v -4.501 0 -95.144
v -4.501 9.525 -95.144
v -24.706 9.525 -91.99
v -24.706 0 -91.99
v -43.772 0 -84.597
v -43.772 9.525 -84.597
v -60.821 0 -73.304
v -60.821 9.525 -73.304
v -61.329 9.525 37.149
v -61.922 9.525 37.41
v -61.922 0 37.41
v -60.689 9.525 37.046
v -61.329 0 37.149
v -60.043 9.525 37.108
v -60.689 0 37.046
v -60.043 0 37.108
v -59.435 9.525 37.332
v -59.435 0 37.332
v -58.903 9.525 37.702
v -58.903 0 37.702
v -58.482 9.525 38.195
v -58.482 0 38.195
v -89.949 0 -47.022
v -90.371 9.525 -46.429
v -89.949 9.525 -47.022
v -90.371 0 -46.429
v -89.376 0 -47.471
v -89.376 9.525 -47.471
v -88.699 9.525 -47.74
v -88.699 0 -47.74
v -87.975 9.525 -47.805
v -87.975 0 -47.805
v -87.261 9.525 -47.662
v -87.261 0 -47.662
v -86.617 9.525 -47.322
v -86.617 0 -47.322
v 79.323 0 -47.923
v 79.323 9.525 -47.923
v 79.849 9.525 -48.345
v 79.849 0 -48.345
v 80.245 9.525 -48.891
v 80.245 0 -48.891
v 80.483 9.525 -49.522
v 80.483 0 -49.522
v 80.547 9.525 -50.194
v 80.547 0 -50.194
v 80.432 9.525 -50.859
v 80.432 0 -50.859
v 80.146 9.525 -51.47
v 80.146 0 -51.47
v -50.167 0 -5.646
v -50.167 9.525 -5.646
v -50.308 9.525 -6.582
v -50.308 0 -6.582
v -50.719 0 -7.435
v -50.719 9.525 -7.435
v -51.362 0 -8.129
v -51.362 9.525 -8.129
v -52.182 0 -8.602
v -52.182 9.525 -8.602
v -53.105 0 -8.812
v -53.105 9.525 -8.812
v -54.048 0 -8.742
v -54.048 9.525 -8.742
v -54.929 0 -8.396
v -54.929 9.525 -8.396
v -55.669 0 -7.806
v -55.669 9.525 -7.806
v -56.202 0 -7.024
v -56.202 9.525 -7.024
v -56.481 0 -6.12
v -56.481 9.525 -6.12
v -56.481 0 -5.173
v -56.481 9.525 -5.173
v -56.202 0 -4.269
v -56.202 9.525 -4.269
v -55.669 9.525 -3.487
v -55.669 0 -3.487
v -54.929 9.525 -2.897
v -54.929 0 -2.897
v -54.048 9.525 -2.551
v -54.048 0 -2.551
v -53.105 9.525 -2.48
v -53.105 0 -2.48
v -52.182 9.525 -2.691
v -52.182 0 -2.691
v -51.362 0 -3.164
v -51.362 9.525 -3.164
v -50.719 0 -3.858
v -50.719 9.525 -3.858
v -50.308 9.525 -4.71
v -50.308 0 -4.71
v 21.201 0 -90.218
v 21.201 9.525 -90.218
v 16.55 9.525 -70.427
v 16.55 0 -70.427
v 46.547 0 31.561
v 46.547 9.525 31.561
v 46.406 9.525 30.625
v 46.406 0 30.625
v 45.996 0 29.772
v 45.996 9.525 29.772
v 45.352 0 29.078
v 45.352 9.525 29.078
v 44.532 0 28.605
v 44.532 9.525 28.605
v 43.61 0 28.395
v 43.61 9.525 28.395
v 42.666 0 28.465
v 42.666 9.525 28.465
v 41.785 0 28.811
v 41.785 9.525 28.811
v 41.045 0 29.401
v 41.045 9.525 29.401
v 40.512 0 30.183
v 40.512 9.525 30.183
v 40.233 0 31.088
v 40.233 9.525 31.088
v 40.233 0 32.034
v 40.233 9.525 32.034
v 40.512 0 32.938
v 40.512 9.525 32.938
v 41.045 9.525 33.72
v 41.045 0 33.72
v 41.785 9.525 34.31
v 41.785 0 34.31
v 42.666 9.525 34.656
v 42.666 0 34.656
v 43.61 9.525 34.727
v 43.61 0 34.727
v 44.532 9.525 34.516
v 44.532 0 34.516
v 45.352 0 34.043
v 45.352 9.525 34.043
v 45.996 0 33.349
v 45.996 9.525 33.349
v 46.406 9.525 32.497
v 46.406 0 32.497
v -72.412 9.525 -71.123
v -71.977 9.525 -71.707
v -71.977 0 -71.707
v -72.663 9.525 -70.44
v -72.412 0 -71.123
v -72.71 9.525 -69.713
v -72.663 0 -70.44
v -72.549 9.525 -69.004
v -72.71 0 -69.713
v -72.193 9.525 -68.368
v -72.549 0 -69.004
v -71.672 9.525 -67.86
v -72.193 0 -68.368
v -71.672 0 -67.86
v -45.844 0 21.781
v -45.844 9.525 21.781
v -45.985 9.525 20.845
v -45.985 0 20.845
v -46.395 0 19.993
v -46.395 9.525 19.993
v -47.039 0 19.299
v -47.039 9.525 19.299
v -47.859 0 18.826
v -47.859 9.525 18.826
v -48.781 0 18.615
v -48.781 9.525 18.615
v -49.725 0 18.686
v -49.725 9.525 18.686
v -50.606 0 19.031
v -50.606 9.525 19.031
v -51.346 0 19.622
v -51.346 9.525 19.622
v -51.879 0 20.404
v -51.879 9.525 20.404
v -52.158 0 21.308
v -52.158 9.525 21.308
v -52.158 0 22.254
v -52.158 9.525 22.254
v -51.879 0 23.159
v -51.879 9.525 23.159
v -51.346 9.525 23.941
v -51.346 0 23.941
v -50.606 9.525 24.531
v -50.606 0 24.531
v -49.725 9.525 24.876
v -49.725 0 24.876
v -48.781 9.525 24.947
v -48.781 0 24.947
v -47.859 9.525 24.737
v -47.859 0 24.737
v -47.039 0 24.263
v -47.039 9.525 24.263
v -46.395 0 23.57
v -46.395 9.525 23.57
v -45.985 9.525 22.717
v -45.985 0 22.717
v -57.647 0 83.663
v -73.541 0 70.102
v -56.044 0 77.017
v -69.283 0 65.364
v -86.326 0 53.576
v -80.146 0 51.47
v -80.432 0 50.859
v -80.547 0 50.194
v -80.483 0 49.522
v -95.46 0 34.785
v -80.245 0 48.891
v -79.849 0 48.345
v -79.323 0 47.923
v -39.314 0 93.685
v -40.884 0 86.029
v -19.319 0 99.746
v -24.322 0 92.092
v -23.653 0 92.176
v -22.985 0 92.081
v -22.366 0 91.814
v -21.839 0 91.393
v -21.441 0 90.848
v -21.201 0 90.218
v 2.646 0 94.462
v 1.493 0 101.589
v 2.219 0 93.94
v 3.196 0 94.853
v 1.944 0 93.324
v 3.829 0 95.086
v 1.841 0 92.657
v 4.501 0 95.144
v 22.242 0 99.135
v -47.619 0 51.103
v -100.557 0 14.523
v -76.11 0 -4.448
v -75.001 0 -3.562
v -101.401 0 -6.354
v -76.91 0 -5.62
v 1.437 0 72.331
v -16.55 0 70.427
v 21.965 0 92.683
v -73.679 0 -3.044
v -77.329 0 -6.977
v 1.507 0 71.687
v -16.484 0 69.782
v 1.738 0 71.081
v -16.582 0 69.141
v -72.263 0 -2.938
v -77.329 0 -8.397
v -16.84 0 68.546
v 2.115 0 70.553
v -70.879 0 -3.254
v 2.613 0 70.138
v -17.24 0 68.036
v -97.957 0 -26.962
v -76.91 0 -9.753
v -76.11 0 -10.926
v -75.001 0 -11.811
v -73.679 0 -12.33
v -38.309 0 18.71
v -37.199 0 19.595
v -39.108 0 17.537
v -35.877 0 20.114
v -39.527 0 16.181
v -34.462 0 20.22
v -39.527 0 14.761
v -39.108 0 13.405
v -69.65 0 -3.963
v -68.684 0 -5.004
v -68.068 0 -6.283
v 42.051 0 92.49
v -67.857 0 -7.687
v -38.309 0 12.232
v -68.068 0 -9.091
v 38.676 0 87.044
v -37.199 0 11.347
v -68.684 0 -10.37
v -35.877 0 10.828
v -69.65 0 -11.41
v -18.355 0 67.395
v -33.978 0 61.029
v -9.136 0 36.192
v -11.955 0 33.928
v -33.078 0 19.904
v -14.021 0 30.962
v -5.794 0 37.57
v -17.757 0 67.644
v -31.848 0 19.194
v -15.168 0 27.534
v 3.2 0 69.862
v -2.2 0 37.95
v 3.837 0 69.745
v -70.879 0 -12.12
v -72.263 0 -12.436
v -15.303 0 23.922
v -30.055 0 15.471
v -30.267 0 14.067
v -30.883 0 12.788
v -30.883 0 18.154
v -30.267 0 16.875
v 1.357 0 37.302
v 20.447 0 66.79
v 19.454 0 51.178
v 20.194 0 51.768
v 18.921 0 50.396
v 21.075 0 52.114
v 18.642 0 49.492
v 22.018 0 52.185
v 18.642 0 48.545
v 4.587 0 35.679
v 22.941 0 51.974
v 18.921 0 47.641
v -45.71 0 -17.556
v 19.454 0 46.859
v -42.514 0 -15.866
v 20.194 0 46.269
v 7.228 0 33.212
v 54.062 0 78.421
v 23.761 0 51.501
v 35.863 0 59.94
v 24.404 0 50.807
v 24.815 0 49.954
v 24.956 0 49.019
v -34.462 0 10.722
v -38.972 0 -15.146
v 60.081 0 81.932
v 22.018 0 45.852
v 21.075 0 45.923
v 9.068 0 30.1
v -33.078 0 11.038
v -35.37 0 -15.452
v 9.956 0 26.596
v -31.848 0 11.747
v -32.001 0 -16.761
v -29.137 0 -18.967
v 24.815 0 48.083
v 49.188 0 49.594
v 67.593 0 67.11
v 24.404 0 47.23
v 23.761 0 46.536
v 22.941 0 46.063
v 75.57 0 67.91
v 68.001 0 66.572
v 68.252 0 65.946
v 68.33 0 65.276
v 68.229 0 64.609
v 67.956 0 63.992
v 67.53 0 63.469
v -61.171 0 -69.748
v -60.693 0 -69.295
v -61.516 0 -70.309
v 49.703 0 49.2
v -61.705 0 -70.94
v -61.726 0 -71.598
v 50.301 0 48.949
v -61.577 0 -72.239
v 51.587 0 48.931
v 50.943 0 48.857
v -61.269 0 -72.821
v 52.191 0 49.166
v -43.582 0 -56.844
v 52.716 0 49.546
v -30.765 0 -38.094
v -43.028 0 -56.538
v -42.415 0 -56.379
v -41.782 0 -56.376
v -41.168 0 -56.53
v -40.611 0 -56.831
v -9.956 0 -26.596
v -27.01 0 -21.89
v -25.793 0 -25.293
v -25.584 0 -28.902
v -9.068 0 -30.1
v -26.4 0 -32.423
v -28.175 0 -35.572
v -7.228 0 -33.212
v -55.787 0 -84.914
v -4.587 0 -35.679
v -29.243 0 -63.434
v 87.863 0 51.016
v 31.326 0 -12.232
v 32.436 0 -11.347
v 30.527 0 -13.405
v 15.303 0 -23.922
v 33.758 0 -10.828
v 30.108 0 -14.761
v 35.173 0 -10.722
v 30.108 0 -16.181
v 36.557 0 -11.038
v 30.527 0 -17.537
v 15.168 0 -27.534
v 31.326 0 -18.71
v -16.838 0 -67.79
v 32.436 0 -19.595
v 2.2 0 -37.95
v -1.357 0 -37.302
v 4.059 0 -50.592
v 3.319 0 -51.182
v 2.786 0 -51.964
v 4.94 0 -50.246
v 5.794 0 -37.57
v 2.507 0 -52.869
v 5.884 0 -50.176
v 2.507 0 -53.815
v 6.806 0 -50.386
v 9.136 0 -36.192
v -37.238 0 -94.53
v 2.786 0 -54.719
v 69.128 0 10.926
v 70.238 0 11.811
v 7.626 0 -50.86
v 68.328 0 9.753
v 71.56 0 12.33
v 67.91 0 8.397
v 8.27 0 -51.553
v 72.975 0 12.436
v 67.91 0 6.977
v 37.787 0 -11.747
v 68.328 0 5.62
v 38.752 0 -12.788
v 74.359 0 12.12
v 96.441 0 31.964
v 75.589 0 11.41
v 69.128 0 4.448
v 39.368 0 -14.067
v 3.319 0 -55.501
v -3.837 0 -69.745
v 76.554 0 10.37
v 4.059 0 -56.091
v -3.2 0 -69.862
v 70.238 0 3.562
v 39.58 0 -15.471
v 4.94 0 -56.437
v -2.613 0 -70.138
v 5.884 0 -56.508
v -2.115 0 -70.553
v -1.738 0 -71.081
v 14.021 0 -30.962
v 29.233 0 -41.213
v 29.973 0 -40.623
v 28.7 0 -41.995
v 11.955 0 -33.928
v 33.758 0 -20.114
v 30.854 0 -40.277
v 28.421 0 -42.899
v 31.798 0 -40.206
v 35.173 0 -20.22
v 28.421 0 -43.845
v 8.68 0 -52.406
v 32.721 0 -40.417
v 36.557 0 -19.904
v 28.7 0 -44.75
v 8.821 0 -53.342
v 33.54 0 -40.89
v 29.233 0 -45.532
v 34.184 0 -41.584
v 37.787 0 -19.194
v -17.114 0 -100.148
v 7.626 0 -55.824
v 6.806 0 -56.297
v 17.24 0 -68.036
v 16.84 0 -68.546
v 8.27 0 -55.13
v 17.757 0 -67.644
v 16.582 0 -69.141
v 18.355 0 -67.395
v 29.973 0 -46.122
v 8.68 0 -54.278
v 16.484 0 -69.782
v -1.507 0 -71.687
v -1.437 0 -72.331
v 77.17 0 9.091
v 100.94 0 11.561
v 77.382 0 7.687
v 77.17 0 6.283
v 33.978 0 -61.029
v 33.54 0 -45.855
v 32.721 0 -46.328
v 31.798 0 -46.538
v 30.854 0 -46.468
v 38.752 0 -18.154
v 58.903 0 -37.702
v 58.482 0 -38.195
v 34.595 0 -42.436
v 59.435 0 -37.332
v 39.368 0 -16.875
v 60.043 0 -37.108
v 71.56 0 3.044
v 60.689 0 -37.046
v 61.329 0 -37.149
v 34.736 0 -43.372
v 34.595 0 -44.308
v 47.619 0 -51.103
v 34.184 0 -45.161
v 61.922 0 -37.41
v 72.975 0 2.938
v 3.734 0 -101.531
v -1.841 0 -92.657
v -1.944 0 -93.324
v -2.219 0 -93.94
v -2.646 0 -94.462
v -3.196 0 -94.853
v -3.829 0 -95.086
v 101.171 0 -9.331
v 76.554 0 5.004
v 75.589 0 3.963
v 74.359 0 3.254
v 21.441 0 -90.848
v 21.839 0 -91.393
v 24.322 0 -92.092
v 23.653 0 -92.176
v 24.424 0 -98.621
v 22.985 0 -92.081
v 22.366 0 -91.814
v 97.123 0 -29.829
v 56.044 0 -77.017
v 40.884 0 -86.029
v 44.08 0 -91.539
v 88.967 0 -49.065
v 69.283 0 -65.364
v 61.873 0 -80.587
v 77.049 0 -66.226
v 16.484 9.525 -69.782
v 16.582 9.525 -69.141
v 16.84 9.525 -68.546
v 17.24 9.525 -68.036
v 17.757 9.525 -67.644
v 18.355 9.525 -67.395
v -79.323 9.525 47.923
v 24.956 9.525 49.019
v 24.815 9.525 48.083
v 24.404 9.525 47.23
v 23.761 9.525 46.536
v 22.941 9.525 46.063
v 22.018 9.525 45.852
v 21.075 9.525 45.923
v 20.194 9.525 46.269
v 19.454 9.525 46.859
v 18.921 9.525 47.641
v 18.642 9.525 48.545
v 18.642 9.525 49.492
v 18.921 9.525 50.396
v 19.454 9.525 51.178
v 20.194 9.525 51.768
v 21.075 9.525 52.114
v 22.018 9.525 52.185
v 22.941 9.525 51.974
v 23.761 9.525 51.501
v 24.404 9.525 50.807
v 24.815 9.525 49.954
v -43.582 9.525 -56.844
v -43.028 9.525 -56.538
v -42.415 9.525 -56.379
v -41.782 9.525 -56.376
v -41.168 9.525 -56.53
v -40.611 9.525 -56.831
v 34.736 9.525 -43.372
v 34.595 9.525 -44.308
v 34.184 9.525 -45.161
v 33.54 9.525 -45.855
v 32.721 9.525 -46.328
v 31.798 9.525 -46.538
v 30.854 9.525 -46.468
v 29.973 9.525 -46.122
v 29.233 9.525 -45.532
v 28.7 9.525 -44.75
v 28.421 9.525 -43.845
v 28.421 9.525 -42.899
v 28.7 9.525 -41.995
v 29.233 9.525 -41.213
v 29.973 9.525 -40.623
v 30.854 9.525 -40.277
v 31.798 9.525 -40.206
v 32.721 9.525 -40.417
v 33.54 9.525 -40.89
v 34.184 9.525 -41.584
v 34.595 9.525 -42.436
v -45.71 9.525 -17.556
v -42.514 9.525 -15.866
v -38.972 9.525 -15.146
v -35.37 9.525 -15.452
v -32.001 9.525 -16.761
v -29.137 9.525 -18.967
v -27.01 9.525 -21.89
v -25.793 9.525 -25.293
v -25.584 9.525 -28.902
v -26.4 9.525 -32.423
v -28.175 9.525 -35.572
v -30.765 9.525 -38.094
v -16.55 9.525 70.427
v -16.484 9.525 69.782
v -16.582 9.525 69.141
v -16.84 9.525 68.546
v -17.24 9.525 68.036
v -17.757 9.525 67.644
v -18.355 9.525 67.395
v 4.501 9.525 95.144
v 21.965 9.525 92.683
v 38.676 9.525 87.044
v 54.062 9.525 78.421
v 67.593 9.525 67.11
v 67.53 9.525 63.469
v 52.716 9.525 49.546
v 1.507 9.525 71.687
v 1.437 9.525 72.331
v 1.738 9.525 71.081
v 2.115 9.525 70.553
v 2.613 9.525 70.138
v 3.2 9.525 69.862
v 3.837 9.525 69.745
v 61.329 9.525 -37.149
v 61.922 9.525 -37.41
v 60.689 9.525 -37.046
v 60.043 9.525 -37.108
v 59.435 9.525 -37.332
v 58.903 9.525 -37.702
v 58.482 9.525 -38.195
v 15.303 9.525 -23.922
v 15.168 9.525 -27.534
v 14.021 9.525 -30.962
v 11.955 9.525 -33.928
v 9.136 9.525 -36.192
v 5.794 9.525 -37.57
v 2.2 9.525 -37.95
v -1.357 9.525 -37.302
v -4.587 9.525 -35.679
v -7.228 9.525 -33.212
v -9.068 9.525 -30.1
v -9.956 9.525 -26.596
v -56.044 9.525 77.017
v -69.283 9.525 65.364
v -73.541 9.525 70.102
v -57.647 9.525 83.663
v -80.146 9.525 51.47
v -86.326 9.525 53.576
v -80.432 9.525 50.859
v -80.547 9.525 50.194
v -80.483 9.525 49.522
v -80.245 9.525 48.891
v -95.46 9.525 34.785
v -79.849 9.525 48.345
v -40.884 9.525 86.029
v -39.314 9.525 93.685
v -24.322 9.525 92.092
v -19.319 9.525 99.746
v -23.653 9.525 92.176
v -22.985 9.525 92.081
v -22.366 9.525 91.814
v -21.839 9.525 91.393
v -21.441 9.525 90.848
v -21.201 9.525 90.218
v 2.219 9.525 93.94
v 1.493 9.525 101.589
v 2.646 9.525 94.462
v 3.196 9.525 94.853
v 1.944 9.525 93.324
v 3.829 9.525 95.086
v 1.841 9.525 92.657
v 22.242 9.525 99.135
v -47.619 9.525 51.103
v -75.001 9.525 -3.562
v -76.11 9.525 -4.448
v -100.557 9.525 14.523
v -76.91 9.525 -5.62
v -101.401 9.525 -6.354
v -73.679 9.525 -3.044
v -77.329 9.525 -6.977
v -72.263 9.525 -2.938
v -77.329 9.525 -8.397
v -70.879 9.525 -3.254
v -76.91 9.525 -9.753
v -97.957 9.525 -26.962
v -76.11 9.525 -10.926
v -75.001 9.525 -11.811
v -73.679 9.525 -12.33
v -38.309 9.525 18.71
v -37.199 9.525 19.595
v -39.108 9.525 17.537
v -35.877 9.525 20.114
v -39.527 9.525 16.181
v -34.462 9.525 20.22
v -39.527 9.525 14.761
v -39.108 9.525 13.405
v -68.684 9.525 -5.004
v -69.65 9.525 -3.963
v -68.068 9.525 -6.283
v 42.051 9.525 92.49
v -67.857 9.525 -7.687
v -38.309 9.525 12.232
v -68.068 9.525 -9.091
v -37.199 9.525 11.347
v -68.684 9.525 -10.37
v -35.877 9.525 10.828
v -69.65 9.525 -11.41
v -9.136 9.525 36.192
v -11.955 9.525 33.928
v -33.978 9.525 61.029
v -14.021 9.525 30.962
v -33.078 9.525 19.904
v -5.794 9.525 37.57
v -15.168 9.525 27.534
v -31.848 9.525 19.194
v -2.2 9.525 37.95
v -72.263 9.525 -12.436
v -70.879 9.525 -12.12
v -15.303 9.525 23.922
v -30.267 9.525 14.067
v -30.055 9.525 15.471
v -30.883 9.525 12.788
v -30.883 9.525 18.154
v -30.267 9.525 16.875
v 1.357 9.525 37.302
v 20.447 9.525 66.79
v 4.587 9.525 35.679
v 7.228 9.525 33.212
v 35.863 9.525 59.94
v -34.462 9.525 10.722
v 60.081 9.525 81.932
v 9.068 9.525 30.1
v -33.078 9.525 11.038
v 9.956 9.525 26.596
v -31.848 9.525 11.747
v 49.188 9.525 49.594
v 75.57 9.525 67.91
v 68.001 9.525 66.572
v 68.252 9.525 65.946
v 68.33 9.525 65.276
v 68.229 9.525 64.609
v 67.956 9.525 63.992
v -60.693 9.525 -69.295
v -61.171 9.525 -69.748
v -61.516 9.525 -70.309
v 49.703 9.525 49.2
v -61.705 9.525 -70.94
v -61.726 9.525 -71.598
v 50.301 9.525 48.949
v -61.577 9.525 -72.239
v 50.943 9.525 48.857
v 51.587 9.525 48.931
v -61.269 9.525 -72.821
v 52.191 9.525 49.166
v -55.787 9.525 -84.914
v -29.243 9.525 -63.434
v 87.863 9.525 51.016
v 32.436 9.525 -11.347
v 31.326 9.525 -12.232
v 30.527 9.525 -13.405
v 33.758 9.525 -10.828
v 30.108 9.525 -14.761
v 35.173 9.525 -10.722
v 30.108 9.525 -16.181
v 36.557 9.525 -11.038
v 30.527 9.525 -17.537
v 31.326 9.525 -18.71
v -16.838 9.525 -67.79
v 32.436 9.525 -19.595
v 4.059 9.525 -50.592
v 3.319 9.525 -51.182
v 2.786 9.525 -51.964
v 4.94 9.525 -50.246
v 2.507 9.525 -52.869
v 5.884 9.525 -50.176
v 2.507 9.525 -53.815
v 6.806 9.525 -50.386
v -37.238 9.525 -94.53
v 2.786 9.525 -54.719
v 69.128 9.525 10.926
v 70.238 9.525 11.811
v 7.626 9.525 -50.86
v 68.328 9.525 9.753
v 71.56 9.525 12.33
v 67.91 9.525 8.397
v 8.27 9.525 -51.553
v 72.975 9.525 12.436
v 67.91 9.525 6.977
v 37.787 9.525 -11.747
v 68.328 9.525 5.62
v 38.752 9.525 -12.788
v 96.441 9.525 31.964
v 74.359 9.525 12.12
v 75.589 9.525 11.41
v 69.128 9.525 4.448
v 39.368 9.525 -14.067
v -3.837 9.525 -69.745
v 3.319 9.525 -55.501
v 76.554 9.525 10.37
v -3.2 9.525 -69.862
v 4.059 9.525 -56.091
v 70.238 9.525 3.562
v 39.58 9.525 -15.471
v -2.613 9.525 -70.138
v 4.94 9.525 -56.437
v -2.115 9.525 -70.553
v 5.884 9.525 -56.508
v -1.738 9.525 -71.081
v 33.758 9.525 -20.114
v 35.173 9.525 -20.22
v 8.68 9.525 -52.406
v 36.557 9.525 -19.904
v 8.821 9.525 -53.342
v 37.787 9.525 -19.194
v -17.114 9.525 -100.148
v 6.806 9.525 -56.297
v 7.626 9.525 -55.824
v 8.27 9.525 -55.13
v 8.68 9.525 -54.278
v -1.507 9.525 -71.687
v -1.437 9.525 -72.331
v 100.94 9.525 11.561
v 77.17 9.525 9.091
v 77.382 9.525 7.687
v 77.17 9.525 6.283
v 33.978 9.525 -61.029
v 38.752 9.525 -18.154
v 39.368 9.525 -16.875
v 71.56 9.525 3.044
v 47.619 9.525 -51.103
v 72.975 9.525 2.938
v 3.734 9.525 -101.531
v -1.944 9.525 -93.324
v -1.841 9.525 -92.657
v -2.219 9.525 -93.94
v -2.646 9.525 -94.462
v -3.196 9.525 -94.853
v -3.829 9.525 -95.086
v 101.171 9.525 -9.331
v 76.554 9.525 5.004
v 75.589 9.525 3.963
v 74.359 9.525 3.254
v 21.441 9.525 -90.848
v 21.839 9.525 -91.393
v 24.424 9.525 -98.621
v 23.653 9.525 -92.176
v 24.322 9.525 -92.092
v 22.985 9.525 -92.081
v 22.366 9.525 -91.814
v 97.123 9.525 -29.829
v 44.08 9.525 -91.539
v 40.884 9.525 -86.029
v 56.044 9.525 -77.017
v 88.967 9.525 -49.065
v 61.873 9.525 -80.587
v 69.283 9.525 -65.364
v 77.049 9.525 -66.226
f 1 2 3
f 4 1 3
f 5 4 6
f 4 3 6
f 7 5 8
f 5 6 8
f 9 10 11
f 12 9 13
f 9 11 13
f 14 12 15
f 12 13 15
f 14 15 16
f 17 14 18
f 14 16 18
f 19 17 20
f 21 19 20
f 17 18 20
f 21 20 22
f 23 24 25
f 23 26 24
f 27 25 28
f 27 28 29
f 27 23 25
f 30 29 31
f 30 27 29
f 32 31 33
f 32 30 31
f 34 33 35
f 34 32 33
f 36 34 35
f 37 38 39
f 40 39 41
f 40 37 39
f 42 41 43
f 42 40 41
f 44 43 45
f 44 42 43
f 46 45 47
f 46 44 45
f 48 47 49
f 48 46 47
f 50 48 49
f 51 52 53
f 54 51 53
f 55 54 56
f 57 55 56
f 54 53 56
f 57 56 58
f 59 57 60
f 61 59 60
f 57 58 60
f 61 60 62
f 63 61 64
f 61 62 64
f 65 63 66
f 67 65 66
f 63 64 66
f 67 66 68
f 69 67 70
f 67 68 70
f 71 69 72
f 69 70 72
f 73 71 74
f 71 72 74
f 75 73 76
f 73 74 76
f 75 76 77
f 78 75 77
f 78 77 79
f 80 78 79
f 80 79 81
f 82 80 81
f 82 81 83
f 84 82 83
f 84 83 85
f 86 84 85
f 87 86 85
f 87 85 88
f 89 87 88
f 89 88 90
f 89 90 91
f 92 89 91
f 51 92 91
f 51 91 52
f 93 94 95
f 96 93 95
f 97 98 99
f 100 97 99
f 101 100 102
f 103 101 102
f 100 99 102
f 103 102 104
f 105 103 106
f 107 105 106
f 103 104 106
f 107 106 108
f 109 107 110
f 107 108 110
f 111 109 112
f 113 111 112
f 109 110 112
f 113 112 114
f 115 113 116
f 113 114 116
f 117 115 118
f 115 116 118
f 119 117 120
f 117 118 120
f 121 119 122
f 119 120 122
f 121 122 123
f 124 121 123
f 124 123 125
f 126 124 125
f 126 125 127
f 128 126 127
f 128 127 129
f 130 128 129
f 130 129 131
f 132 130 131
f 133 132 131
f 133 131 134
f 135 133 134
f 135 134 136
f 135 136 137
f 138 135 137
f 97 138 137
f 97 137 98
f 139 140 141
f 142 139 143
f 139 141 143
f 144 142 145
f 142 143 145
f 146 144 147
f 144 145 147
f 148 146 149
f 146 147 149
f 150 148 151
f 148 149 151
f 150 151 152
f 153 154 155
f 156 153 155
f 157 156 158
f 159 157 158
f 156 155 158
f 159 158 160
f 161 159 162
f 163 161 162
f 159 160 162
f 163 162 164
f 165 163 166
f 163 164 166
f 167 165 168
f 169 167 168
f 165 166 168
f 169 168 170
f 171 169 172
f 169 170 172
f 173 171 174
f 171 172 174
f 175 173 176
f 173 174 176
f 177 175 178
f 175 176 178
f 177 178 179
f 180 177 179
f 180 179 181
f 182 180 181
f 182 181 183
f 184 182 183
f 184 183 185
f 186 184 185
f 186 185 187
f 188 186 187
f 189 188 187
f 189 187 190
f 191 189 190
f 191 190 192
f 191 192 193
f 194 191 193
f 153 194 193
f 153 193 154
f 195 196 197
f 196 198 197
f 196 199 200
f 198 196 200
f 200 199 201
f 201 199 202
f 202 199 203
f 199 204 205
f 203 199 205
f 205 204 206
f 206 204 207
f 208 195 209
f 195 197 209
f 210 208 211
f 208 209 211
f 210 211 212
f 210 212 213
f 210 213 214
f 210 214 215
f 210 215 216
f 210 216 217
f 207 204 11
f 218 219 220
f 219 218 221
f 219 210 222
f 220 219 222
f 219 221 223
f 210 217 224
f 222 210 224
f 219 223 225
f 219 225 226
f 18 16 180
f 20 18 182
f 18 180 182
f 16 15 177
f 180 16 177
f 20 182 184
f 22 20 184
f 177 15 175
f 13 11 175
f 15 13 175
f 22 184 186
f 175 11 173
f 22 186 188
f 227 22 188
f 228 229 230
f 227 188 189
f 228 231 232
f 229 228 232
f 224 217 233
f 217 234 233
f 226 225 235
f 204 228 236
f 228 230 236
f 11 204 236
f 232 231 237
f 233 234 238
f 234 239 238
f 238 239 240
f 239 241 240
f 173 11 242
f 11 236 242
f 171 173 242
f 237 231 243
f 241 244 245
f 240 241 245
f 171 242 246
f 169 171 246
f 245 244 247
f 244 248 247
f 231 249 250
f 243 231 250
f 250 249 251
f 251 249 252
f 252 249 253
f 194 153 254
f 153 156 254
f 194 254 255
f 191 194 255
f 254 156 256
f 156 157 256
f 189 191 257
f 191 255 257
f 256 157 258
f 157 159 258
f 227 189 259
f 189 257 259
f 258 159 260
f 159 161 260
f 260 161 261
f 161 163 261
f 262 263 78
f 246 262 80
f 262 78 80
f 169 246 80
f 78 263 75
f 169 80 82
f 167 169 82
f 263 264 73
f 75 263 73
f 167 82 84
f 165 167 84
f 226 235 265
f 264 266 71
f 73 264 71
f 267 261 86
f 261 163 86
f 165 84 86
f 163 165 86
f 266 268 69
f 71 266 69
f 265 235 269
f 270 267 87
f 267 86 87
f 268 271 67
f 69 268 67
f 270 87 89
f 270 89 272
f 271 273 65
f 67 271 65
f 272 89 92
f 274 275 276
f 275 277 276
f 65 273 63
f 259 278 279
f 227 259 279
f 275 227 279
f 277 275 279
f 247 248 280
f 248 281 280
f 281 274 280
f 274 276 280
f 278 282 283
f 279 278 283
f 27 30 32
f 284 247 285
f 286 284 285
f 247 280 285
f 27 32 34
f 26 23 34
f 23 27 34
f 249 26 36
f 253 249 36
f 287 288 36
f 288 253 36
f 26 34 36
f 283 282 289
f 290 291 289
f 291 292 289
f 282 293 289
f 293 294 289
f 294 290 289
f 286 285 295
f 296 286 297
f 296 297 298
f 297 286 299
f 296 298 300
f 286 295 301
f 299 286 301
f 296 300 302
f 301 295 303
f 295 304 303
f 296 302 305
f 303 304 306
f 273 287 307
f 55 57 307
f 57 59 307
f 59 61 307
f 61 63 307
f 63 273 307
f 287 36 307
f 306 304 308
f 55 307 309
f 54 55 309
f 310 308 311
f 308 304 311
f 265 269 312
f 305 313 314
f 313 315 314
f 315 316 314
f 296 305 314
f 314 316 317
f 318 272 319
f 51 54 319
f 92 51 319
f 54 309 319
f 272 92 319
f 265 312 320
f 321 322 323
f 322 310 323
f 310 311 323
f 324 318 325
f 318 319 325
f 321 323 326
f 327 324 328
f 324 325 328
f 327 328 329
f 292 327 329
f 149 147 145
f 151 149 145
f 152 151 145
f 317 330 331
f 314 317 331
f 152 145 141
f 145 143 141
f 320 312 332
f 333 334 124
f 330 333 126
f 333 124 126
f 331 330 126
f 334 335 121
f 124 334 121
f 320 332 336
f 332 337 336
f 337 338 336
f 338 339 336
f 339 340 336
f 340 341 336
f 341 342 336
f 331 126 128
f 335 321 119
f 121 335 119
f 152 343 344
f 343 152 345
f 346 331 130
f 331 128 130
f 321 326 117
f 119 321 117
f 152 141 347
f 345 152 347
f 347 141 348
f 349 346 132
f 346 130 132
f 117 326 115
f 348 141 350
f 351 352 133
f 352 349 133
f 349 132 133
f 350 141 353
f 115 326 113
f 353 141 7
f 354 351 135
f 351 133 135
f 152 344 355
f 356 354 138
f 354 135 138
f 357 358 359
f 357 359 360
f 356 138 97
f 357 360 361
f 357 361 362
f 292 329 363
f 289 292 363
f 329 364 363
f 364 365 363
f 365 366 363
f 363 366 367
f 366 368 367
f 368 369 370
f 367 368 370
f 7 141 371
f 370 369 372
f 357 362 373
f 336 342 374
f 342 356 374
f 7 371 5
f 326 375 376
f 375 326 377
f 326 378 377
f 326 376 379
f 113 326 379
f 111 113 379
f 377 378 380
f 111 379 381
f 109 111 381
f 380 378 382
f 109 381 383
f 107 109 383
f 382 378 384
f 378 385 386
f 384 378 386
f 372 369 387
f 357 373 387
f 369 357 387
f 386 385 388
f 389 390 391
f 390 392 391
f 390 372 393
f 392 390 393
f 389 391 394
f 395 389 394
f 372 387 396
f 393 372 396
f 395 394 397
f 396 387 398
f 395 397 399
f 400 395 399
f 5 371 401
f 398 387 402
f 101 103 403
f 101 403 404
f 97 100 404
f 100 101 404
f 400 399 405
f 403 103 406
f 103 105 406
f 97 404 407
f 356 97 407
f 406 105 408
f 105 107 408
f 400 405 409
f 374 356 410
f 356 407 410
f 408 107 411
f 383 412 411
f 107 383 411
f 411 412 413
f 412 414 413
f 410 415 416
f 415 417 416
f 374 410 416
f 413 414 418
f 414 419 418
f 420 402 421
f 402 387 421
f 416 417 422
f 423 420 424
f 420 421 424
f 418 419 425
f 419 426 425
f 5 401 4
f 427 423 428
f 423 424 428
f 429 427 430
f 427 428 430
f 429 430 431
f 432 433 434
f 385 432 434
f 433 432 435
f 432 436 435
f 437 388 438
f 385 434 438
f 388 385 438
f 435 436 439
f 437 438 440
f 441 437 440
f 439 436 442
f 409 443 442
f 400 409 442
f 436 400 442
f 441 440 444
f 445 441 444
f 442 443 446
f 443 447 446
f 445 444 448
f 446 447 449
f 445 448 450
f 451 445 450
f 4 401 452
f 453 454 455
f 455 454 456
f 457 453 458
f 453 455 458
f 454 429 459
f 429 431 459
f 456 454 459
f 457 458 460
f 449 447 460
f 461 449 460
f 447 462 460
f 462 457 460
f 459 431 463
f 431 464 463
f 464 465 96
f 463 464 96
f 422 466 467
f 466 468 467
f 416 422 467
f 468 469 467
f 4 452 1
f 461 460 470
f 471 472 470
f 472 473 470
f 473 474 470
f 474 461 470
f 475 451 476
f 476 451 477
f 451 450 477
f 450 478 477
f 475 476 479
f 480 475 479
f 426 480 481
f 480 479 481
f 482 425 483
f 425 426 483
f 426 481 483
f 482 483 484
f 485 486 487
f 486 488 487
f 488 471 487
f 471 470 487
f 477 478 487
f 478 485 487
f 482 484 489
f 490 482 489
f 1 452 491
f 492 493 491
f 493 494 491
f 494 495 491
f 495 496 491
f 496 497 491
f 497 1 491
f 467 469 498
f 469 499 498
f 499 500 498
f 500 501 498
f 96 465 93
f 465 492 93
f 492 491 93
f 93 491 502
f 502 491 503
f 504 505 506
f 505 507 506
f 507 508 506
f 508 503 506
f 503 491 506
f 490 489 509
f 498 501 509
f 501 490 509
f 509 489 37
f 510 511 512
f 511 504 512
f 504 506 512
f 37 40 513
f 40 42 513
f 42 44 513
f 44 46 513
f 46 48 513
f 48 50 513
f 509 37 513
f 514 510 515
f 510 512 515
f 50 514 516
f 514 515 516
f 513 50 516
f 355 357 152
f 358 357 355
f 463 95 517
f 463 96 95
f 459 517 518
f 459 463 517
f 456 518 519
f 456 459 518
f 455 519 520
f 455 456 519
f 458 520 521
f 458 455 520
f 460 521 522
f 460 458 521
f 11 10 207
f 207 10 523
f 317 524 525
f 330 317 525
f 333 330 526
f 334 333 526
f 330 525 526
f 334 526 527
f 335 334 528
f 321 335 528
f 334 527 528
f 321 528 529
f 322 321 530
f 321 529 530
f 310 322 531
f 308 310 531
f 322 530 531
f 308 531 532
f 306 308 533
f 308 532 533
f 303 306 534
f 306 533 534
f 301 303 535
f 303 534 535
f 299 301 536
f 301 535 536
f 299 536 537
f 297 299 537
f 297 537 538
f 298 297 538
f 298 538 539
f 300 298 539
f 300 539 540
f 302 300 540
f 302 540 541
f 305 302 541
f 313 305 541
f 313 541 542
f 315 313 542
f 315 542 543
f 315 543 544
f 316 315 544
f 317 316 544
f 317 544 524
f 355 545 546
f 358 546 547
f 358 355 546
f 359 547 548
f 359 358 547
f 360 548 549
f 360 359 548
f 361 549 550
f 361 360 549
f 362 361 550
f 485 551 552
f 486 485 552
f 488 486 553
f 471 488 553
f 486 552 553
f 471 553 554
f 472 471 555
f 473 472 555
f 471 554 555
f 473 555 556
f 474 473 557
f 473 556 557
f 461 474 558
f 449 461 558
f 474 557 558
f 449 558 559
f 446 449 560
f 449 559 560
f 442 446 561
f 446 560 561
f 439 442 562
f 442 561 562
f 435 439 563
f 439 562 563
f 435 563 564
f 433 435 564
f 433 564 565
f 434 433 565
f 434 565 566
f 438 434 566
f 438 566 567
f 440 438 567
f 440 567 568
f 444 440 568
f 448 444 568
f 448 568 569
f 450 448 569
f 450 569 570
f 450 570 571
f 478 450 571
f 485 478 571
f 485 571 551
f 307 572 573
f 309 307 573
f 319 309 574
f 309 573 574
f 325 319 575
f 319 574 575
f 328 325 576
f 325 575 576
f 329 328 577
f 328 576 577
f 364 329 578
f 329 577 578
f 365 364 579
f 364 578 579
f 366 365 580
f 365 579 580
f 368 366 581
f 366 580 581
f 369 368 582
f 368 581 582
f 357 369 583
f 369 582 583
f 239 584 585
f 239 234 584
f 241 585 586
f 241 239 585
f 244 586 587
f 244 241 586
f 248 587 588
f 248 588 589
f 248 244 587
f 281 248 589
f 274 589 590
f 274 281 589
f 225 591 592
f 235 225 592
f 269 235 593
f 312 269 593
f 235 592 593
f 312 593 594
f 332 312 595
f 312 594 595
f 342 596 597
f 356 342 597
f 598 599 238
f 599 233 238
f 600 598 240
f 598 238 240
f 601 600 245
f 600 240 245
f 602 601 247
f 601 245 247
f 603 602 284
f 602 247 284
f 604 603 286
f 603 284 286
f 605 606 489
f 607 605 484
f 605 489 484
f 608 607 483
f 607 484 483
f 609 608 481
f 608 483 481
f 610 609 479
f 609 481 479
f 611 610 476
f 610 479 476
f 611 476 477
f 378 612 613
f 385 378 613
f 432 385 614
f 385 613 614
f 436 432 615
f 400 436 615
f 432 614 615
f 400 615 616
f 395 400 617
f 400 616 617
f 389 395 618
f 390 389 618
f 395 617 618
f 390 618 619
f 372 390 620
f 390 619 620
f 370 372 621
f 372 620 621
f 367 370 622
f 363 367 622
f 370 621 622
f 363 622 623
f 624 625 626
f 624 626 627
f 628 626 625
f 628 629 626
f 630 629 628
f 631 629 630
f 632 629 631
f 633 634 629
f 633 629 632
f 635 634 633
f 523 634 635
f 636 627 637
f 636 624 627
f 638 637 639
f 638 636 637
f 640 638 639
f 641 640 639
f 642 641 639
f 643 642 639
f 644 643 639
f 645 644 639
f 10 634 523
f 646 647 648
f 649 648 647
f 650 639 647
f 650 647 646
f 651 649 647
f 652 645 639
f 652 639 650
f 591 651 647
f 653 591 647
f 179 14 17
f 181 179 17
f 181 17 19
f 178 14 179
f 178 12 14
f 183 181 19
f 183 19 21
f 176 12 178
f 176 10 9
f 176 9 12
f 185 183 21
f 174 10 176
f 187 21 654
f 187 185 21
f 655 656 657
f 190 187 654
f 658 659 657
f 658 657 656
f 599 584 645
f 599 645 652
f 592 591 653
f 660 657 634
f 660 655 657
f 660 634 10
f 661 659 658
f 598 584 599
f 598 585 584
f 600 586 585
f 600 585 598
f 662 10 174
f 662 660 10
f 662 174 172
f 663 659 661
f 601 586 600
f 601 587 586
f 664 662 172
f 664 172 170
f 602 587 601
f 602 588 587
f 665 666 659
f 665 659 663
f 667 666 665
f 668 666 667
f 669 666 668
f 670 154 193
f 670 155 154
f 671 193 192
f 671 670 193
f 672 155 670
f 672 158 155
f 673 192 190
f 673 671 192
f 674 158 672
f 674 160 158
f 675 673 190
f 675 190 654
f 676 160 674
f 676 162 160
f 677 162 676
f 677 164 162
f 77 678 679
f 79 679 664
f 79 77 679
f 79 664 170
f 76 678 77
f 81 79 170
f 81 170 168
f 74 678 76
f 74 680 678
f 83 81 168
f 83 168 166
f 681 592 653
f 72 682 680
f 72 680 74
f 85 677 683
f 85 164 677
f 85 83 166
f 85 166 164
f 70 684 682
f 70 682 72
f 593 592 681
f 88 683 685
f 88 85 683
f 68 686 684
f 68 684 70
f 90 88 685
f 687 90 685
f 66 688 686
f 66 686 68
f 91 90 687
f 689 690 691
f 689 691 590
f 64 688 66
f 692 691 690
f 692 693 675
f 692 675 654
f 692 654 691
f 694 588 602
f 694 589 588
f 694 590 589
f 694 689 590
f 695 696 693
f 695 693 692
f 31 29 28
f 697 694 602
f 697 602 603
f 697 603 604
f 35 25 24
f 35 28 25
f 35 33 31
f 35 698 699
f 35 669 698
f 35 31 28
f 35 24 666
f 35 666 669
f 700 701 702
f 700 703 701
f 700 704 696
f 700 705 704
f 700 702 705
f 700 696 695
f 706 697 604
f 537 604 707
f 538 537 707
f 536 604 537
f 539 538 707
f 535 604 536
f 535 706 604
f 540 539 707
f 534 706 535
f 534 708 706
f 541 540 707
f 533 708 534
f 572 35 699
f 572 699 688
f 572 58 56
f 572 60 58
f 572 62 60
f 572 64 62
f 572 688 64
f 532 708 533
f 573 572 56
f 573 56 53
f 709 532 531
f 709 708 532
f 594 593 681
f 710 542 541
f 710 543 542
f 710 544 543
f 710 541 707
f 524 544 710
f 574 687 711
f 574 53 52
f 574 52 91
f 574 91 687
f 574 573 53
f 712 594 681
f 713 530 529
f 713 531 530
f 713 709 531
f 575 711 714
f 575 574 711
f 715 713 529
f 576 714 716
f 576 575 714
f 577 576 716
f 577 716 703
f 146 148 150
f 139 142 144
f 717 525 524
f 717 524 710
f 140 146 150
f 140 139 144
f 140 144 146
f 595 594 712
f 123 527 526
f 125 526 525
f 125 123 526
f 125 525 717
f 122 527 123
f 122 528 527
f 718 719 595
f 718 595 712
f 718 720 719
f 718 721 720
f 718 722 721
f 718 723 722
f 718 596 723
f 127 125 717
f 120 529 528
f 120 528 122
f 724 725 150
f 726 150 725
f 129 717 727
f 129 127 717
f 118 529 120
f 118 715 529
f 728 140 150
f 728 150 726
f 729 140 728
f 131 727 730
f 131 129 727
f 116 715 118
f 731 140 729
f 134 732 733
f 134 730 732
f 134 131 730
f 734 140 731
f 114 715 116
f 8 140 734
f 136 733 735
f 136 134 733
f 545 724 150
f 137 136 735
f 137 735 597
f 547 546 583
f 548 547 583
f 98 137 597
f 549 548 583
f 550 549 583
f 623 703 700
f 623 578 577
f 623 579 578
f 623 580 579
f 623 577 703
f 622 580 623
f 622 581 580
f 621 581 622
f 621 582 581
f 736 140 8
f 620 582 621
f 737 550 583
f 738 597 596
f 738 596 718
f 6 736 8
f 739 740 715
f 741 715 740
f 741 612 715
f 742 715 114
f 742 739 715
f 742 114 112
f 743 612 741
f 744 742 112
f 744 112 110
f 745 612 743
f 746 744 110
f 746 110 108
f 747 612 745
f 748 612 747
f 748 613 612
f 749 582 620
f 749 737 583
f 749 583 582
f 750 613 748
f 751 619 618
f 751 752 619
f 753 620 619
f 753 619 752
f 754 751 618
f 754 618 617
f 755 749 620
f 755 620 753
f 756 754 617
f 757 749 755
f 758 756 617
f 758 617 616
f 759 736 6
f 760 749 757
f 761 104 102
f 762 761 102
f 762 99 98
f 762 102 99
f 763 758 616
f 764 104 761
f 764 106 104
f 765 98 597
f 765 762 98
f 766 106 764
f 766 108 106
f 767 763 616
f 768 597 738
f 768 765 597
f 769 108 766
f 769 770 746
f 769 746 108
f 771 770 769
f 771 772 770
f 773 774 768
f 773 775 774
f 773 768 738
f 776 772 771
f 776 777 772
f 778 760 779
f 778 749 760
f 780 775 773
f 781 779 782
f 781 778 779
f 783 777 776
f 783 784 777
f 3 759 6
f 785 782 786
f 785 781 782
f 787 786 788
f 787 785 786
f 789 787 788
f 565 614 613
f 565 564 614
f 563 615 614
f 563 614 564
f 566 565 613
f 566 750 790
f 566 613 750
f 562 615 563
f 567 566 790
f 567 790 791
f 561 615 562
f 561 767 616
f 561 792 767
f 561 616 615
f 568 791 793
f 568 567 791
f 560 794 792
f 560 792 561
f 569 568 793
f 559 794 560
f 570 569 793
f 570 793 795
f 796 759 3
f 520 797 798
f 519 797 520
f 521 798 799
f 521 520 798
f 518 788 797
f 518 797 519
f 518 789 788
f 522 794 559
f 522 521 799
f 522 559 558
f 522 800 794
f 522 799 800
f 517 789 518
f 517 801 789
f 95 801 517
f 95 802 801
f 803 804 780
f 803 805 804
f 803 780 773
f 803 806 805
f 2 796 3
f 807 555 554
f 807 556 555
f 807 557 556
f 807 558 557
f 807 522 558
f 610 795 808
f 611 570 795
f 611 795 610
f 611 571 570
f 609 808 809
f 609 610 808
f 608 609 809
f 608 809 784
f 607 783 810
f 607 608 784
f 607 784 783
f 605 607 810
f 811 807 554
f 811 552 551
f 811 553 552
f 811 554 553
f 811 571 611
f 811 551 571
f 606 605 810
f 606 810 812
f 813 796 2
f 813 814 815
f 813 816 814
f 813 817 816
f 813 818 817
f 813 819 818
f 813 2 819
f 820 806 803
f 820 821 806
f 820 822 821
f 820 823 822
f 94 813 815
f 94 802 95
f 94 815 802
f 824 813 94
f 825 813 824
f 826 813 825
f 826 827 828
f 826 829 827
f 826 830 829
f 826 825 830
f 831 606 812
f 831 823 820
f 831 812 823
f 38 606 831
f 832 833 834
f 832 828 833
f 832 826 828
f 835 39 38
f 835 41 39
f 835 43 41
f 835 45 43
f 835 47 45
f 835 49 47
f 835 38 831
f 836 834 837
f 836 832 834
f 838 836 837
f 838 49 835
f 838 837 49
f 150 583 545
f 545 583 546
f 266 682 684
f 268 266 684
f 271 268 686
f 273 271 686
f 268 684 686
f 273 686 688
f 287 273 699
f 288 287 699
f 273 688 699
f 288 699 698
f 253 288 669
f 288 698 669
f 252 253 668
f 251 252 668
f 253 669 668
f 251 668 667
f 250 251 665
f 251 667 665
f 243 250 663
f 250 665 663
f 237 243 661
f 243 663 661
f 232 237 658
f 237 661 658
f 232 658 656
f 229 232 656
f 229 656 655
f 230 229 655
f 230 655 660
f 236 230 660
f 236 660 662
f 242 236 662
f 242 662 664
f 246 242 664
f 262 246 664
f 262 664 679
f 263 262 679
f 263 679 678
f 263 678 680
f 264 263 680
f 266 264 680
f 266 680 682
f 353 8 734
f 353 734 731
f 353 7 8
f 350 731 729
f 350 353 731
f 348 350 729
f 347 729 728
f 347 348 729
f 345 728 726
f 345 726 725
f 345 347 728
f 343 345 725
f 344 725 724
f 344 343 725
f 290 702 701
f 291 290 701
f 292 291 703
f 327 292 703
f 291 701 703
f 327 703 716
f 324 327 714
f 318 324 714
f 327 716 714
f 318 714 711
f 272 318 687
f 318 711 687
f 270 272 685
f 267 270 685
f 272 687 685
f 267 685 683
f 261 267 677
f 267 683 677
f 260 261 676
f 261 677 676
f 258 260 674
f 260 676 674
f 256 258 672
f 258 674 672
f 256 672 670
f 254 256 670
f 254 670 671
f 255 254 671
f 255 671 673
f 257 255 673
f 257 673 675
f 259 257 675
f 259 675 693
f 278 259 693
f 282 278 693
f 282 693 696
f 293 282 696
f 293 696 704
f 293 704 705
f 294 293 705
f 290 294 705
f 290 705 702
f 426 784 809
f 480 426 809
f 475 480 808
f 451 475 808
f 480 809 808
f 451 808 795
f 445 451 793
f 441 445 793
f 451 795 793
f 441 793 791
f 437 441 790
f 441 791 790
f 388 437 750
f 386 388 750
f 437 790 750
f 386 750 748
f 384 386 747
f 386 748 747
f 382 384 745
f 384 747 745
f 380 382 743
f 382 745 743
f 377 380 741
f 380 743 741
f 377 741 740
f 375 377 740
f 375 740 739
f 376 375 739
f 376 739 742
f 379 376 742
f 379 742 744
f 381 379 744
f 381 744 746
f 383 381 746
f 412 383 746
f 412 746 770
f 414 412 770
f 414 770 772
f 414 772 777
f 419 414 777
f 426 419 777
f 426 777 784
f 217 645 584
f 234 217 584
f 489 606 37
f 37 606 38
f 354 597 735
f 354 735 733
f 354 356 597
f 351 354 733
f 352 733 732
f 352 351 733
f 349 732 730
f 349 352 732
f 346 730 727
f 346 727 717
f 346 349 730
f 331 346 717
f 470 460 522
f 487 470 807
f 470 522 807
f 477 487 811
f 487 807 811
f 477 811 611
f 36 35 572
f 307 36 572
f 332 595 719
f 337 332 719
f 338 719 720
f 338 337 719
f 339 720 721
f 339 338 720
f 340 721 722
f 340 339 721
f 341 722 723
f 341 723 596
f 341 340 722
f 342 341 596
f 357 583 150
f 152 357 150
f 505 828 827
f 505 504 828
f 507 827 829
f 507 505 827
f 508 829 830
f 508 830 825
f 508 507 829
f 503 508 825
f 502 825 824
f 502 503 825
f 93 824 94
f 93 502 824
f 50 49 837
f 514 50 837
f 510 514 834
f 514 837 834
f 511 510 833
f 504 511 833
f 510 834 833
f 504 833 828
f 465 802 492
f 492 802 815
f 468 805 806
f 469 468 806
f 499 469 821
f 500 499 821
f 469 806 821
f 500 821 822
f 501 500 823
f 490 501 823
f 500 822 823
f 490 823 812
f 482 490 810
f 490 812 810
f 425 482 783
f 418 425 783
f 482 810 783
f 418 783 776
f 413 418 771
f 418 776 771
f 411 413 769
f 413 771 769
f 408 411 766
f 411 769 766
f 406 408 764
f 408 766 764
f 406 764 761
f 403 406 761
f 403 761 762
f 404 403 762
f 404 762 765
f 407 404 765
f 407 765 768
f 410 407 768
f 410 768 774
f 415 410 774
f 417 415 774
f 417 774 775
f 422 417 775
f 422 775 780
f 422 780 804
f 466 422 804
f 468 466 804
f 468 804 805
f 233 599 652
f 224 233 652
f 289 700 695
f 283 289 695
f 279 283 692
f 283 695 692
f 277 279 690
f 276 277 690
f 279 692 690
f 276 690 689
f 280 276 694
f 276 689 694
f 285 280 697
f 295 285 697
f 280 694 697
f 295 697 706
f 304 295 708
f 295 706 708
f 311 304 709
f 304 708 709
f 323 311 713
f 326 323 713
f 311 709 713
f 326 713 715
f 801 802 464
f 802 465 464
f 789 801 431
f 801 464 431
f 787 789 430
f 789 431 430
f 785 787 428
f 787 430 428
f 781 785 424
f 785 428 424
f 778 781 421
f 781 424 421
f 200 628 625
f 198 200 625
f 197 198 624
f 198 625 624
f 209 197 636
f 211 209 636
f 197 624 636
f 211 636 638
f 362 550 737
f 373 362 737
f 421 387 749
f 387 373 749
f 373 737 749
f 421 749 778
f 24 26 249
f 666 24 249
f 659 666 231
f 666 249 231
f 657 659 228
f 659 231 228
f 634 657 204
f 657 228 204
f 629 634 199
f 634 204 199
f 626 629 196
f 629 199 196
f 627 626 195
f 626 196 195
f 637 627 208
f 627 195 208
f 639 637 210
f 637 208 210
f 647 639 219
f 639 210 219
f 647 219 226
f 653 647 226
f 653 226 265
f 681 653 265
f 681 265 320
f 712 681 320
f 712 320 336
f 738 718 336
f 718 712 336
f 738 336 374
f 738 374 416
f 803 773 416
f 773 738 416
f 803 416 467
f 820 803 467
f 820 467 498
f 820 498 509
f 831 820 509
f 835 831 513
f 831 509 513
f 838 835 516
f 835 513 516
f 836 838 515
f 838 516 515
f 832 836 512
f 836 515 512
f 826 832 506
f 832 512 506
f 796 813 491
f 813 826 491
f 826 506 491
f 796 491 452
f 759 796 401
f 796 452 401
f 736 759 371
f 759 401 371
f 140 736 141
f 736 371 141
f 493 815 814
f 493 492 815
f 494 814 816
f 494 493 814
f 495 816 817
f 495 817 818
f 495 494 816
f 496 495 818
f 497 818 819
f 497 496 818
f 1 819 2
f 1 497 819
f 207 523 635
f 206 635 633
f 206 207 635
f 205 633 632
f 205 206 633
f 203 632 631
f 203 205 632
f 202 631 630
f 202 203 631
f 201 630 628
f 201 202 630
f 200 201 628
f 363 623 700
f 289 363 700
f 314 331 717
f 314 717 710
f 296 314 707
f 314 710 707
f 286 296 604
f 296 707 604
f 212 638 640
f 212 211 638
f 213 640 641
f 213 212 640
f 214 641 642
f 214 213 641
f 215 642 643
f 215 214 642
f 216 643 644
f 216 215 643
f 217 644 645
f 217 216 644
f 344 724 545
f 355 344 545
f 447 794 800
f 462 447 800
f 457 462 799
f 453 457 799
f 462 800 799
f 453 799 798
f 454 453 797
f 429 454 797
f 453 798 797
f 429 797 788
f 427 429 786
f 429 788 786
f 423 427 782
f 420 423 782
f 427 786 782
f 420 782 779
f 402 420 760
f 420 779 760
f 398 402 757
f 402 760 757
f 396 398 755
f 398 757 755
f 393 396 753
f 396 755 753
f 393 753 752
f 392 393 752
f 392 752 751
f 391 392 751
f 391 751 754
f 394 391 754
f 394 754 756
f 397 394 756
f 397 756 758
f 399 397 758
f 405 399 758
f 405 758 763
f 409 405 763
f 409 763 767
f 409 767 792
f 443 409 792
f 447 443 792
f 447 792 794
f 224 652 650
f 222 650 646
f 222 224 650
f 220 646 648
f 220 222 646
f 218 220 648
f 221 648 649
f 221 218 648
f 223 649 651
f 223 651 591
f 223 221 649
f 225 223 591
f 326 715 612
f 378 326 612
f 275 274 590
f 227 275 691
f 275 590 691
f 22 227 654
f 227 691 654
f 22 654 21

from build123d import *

# Parameters (mm, degrees)
SKETCH1_R           = 101.6
BOSS_EXTRUDE1_DEPTH = 9.525
SKETCH2_R           = 4.7625
SKETCH2_R_2         = 3.175
CUT_EXTRUDE1_DEPTH  = 22.86
SKETCH3_R           = 4.7625
CUT_EXTRUDE2_DEPTH  = 10.525
FILLET1_R           = 2.54
FILLET3_R           = 2.54


with BuildPart() as part:
    # Sketch1 → Boss-Extrude1 (new body)
    with BuildSketch(Plane(origin=(0, 0, 0), x_dir=(1, 0, 0), z_dir=(0, 1, 0))):
        Circle(SKETCH1_R)
    extrude(amount=BOSS_EXTRUDE1_DEPTH)

    # Sketch2 → Cut-Extrude1 (cut)
    with BuildSketch(Plane(origin=(0, 9.525, 0), x_dir=(1, 0, 0), z_dir=(0, 1, 0))):
        with BuildLine():
            Line((-9.955759688, 26.595729902), (-15.303128109, -23.922045692))
            ThreePointArc((-15.303128109, -23.922045692), (-4.010526316, -37.888331696), (9.955759688, -26.595729902))
            Line((9.955759688, -26.595729902), (15.303128109, 23.922045692))
            ThreePointArc((15.303128109, 23.922045692), (4.010526316, 37.888331696), (-9.955759688, 26.595729902))
        make_face()
        with Locations((34.817520913, 15.470948176)):
            Circle(SKETCH2_R)
        with Locations((-34.817520913, -15.470948176)):
            Circle(SKETCH2_R)
        with BuildLine():
            Line((-30.765292524, 38.093536125), (-87.237043764, 79.186441231))
            Line((-87.237043764, 79.186441231), (-104.485964967, 60.325))
            Line((-104.485964967, 60.325), (-45.710214871, 17.555539727))
            ThreePointArc((-45.710214871, 17.555539727), (-27.968755498, 20.352076753), (-30.765292524, 38.093536125))
        make_face()
        with Locations((5.646300897, 53.341856998)):
            Circle(SKETCH2_R_2)
        with Locations((31.560768513, 43.372252797)):
            Circle(SKETCH2_R_2)
        with Locations((-53.341856998, 5.646300897)):
            Circle(SKETCH2_R_2)
        with Locations((43.372252797, -31.560768513)):
            Circle(SKETCH2_R_2)
        with Locations((-49.018553694, -21.781088485)):
            Circle(SKETCH2_R_2)
        with Locations((21.781088485, -49.018553694)):
            Circle(SKETCH2_R_2)
    extrude(amount=-CUT_EXTRUDE1_DEPTH, mode=Mode.SUBTRACT)

    # Sketch3 → Cut-Extrude2 (cut, through all)
    with BuildSketch(Plane(origin=(0, 9.525, 0), x_dir=(1, 0, 0), z_dir=(0, 1, 0))):
        with BuildLine():
            ThreePointArc((15.979287148, 67.997682918), (41.099184753, 56.47901834), (59.78603337, 36.119976659))
            Line((59.78603337, 36.119976659), (81.526409141, 49.254513627))
            ThreePointArc((81.526409141, 49.254513627), (56.044342845, 77.016843191), (21.78993702, 92.72411307))
            Line((21.78993702, 92.72411307), (15.979287148, 67.997682918))
        make_face()
        with BuildLine():
            ThreePointArc((50.898077232, -47.837310063), (28.362672287, -63.832447241), (1.387800686, -69.83621202))
            Line((1.387800686, -69.83621202), (1.892455481, -95.231198209))
            ThreePointArc((1.892455481, -95.231198209), (38.6763713, -87.044246238), (69.406468953, -65.232695541))
            Line((69.406468953, -65.232695541), (50.898077232, -47.837310063))
        make_face()
        with BuildLine():
            ThreePointArc((-15.979287148, -67.997682918), (-41.099184753, -56.47901834), (-59.78603337, -36.119976659))
            Line((-59.78603337, -36.119976659), (-81.526409141, -49.254513627))
            ThreePointArc((-81.526409141, -49.254513627), (-56.044342845, -77.016843191), (-21.78993702, -92.72411307))
            Line((-21.78993702, -92.72411307), (-15.979287148, -67.997682918))
        make_face()
        with BuildLine():
            ThreePointArc((-42.080853774, 55.751450615), (-22.846796408, 66.00792675), (-1.387800686, 69.83621202))
            Line((-1.387800686, 69.83621202), (-1.892455481, 95.231198209))
            ThreePointArc((-1.892455481, 95.231198209), (-34.737758173, 88.689631058), (-63.288565419, 71.183705911))
            Line((-63.288565419, 71.183705911), (-42.080853774, 55.751450615))
        make_face()
        with Locations((-72.619302416, 7.686842105)):
            Circle(SKETCH3_R)
        with Locations((72.619302416, -7.686842105)):
            Circle(SKETCH3_R)
    extrude(amount=-CUT_EXTRUDE2_DEPTH, mode=Mode.SUBTRACT)

    # Fillet1
    fillet1_edges = [part.edges().sort_by_distance(p)[0] for p in [
        (-74.035185173, 4.7625, -69.579820037),
        (-88.980107519, 4.7625, -49.041823639),
    ]]
    fillet(fillet1_edges, radius=FILLET1_R)

    # Fillet3
    fillet3_edges = [part.edges().sort_by_distance(p)[0] for p in [
        (-15.979287148, 4.7625, 67.997682918),
        (-21.78993702, 4.7625, 92.72411307),
        (-81.526409141, 4.7625, 49.254513627),
        (-59.78603337, 4.7625, 36.119976659),
        (50.898077232, 4.7625, 47.837310063),
        (69.406468953, 4.7625, 65.232695541),
        (1.892455481, 4.7625, 95.231198209),
        (1.387800686, 4.7625, 69.83621202),
        (15.979287148, 4.7625, -67.997682918),
        (21.78993702, 4.7625, -92.72411307),
        (81.526409141, 4.7625, -49.254513627),
        (59.78603337, 4.7625, -36.119976659),
        (-42.080853774, 4.7625, -55.751450615),
        (-63.288565419, 4.7625, -71.183705911),
        (-1.892455481, 4.7625, -95.231198209),
        (-1.387800686, 4.7625, -69.83621202),
    ]]
    fillet(fillet3_edges, radius=FILLET3_R)


solid = part.part
